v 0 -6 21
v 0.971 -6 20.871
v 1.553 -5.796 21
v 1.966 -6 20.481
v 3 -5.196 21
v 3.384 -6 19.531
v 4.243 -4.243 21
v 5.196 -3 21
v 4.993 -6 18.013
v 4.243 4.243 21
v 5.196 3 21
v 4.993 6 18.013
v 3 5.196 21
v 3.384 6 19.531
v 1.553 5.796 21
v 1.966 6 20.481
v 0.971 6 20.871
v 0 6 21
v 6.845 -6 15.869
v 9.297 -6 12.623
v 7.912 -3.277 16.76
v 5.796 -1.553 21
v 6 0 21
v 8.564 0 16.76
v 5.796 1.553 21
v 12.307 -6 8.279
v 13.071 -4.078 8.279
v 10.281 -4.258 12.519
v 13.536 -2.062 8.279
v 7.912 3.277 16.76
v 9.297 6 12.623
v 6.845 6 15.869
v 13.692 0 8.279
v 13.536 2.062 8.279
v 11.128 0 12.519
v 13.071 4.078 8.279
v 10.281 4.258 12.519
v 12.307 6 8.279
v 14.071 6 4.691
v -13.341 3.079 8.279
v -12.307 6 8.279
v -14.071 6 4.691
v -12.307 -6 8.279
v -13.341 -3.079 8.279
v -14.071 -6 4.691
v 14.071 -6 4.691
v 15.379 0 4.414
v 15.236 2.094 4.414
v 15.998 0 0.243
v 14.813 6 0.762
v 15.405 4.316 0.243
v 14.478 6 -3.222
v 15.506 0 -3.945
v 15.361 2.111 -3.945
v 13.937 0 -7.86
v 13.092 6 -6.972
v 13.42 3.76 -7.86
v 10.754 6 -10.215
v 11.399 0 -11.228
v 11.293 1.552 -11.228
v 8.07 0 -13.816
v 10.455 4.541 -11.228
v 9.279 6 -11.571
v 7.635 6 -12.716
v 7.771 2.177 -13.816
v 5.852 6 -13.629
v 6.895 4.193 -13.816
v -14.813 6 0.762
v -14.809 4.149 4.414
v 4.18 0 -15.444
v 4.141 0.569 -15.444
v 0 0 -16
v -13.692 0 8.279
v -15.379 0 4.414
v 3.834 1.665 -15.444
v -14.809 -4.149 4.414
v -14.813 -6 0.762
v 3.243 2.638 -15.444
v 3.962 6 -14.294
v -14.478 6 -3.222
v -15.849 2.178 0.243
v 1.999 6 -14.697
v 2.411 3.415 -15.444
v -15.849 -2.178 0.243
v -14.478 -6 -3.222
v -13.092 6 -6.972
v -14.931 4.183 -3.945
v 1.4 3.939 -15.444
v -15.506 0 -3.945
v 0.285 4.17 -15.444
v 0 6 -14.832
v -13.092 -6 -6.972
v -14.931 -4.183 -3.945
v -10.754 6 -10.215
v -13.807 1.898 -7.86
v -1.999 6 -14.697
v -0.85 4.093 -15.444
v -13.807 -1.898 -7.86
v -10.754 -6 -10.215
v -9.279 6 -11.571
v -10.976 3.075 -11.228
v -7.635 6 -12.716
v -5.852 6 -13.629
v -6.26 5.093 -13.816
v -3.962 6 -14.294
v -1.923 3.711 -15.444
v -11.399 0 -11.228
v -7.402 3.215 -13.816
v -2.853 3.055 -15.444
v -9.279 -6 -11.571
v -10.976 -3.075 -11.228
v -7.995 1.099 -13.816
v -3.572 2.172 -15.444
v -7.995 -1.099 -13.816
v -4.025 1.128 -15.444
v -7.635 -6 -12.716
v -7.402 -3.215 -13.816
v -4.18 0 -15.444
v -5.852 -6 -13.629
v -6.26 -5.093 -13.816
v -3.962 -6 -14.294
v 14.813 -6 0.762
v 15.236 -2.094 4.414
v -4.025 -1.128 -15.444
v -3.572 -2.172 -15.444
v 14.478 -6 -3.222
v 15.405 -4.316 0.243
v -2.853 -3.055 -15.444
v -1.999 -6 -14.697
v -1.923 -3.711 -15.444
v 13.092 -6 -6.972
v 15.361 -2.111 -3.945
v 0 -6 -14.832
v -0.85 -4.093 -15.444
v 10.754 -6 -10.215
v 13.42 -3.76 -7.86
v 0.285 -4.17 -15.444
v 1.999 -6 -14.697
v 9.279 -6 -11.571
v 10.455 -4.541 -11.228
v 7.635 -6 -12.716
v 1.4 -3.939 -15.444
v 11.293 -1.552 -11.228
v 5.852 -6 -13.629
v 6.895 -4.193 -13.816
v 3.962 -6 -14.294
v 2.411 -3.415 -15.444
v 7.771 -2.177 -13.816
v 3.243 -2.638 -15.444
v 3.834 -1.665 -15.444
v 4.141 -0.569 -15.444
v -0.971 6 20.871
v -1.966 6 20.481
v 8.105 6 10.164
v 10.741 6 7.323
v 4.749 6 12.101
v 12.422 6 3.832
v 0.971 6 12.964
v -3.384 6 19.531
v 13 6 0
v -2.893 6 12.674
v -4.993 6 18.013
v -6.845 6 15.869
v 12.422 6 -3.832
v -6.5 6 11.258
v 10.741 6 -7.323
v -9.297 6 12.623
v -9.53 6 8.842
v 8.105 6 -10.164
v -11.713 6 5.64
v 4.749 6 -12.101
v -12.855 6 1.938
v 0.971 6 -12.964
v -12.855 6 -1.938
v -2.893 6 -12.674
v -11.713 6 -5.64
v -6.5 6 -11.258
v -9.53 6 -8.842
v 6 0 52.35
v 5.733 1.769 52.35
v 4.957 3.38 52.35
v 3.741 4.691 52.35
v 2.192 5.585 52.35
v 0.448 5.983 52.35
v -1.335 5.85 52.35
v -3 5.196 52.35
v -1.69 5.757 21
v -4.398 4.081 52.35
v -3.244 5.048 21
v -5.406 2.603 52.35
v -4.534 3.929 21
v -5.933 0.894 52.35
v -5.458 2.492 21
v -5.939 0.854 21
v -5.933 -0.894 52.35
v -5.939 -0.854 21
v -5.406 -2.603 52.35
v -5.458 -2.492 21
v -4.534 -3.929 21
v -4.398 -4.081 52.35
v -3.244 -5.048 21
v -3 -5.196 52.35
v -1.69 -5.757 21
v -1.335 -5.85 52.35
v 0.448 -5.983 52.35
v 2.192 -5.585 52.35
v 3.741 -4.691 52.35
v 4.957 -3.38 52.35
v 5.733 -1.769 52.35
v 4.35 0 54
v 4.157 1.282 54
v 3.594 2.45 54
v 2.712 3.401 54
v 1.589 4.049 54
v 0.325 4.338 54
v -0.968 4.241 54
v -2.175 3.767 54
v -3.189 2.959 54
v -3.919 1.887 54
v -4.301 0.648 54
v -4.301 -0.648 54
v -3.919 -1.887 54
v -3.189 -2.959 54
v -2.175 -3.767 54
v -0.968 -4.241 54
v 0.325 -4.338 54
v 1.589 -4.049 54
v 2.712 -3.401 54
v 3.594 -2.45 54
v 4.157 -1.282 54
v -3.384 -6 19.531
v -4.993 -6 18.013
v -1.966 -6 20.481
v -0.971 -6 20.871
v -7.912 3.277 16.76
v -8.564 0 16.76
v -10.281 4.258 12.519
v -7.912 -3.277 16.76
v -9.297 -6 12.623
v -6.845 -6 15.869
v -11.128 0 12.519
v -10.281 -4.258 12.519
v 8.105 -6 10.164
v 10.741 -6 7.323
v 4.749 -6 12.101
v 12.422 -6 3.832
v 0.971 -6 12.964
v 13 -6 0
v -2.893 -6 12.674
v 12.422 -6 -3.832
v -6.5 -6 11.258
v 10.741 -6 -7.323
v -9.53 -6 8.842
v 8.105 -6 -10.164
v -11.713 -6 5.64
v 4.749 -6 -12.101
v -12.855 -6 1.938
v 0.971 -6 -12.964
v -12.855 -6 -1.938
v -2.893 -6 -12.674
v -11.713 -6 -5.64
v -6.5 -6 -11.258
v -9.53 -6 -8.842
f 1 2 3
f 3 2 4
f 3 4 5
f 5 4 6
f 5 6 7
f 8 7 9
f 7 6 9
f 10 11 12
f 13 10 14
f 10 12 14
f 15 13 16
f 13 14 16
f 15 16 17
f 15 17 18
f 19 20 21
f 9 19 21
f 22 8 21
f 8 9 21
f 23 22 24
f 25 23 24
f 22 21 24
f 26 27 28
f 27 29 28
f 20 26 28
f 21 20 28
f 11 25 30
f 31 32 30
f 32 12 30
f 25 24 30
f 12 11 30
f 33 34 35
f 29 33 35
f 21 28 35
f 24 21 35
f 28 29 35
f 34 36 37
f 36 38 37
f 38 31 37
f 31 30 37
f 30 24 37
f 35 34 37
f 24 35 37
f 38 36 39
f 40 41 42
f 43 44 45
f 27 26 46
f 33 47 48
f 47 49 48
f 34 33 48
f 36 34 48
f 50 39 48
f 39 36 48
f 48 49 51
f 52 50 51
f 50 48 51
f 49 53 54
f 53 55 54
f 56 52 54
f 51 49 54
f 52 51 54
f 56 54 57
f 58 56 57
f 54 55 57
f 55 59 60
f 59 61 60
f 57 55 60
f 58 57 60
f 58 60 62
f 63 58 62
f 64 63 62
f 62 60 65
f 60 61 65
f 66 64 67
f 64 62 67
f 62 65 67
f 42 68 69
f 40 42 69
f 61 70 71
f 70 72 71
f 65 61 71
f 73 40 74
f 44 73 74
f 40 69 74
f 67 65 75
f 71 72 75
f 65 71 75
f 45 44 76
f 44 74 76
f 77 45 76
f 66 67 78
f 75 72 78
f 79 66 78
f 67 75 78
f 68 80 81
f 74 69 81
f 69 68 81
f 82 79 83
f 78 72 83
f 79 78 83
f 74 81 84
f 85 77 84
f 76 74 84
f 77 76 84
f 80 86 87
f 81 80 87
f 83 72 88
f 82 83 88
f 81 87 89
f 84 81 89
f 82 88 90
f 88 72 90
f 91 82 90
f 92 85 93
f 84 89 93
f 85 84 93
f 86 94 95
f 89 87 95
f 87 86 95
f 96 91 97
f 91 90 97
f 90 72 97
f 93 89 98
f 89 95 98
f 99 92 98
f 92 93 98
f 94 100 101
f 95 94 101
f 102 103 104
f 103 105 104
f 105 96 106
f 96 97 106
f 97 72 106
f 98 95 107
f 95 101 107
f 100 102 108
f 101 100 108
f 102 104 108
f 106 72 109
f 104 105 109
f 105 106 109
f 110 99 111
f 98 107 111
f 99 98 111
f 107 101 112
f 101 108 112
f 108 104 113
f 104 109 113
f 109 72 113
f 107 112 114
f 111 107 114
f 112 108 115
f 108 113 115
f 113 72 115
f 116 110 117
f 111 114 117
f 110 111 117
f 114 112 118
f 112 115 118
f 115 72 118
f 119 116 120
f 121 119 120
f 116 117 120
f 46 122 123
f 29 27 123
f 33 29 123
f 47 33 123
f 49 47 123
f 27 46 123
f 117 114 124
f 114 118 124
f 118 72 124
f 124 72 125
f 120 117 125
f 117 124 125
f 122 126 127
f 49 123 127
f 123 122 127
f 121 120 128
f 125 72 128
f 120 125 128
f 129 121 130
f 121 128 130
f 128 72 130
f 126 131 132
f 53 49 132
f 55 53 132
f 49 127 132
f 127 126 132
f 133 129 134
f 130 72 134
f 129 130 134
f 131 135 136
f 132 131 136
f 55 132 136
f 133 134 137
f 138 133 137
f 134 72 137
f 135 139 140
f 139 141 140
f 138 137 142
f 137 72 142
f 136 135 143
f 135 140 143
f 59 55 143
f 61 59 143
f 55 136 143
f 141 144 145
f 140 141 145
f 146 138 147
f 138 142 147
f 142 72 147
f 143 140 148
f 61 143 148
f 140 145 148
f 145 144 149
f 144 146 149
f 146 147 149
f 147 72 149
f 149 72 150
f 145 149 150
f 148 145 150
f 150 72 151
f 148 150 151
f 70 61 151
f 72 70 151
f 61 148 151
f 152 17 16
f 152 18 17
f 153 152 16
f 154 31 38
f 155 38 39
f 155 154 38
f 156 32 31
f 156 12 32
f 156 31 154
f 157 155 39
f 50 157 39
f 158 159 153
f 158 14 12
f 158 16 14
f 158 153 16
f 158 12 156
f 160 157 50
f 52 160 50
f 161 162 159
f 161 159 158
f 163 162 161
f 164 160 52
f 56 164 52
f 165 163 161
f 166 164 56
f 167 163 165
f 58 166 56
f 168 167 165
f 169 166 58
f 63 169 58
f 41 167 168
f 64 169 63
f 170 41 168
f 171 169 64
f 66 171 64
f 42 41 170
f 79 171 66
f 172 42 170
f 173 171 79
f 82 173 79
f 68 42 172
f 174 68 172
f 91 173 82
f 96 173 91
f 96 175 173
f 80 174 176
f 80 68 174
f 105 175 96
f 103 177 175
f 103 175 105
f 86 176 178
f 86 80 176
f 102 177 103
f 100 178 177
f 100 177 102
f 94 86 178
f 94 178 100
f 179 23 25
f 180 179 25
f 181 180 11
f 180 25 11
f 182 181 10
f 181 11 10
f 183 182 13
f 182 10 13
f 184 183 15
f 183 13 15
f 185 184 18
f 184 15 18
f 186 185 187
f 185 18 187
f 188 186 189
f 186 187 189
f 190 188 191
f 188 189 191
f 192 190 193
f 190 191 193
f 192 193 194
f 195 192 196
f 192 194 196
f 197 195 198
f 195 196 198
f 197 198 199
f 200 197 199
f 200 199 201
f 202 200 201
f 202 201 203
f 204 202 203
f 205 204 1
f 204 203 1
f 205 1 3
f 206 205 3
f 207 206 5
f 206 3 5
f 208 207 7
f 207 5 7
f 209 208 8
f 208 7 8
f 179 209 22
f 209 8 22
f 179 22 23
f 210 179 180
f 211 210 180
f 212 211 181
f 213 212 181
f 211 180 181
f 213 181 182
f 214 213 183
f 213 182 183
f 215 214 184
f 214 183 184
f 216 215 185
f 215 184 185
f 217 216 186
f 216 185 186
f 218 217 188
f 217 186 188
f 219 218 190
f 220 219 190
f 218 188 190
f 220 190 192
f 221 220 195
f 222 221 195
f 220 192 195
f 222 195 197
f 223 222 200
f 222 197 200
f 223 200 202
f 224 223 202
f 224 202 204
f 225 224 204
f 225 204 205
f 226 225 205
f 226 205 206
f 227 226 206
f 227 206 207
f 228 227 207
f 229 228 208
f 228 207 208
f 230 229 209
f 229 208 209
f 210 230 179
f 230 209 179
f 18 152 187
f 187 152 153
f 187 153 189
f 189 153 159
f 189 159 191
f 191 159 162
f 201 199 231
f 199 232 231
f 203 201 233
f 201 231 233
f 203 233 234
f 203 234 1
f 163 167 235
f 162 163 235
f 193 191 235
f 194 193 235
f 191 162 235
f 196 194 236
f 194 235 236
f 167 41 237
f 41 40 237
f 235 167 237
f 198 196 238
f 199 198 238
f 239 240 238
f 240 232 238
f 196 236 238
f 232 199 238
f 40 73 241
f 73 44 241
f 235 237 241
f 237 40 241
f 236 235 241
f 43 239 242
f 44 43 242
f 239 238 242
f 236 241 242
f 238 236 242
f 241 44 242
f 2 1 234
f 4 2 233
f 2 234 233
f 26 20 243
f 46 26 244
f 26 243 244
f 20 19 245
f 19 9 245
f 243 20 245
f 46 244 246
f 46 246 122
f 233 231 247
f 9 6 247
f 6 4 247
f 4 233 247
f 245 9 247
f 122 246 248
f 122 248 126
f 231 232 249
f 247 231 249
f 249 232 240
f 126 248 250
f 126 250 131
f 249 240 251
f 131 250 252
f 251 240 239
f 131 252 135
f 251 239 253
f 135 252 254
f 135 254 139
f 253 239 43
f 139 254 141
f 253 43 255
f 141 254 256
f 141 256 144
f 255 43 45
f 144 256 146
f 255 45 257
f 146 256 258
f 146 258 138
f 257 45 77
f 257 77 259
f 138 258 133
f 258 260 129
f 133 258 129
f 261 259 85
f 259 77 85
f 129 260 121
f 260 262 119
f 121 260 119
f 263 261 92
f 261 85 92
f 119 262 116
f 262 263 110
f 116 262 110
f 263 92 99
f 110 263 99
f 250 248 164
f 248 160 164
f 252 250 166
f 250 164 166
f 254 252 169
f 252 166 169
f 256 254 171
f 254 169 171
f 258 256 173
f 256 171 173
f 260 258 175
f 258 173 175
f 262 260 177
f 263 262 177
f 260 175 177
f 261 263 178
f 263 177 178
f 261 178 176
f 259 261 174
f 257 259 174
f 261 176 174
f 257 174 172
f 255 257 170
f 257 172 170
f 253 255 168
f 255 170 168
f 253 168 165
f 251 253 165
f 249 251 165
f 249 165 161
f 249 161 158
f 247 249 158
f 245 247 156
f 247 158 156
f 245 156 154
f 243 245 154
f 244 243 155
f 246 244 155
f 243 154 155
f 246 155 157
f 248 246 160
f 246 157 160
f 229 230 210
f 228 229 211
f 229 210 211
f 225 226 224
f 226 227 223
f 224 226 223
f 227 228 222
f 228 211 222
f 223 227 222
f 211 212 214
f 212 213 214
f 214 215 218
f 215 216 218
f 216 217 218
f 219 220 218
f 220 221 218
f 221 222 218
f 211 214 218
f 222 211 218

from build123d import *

# Parameters (mm, degrees)
SZKIC1_W                        = 6
SZKIC1_H                        = 33
WYTNIJ_WYCI_GNI_CIE1_DEPTH      = 17
WYTNIJ_WYCI_GNI_CIE1_DEPTH_BACK = 17
SZKIC3_R                        = 13
WYTNIJ_WYCI_GNI_CIE2_DEPTH      = 7
WYTNIJ_WYCI_GNI_CIE2_DEPTH_BACK = 7
SFAZOWANIE1_SIZE                = 1.65


with BuildPart() as part:
    # Szkic1 → Obrót1 (revolve)
    with BuildSketch(Plane(origin=(0, 0, 0), x_dir=(1, 0, 0), z_dir=(0, 1, 0))):
        with BuildLine():
            Line((0, 16), (0, -21))
            Line((0, -21), (6, -21))
            Line((6, -21), (13.691822011, -8.278527045))
            ThreePointArc((13.691822011, -8.278527045), (13.936578359, 7.859502761), (0, 16))
        make_face()
        with Locations((3, -37.5)):
            Rectangle(SZKIC1_W, SZKIC1_H)
    revolve(axis=Axis((0, 0, -26.043516498), (0, 0, 1)))

    # Szkic2 → Wytnij-wyciągnięcie1 (cut, two sides)
    with BuildSketch(Plane(origin=(0, 0, 0), x_dir=(0, 0, -1), z_dir=(1, 0, 0))) as wytnij_wyci_gni_cie1_sk:
        with BuildLine():
            Line((-21, 6), (14.832396974, 6))
            ThreePointArc((14.832396974, 6), (5.052656155, 15.181260349), (-8.278527045, 13.691822011))
            Line((-8.278527045, 13.691822011), (-21, 6))
        make_face()
        with BuildLine():
            Line((-21, -6), (14.832396974, -6))
            ThreePointArc((14.832396974, -6), (5.052656155, -15.181260349), (-8.278527045, -13.691822011))
            Line((-8.278527045, -13.691822011), (-21, -6))
        make_face()
    extrude(amount=WYTNIJ_WYCI_GNI_CIE1_DEPTH, mode=Mode.SUBTRACT)
    extrude(wytnij_wyci_gni_cie1_sk.sketch, amount=-WYTNIJ_WYCI_GNI_CIE1_DEPTH_BACK, mode=Mode.SUBTRACT)

    # Szkic3 → Wytnij-wyciągnięcie2 (cut, two sides)
    with BuildSketch(Plane(origin=(0, 0, 0), x_dir=(1, 0, 0), z_dir=(0, 1, 0))) as wytnij_wyci_gni_cie2_sk:
        Circle(SZKIC3_R)
    extrude(amount=WYTNIJ_WYCI_GNI_CIE2_DEPTH, mode=Mode.SUBTRACT)
    extrude(wytnij_wyci_gni_cie2_sk.sketch, amount=-WYTNIJ_WYCI_GNI_CIE2_DEPTH_BACK, mode=Mode.SUBTRACT)

    # Sfazowanie1
    sfazowanie1_edges = [part.edges().sort_by_distance(p)[0] for p in [
        (-6, 0, 54),
    ]]
    chamfer(sfazowanie1_edges, length=SFAZOWANIE1_SIZE)


solid = part.part
